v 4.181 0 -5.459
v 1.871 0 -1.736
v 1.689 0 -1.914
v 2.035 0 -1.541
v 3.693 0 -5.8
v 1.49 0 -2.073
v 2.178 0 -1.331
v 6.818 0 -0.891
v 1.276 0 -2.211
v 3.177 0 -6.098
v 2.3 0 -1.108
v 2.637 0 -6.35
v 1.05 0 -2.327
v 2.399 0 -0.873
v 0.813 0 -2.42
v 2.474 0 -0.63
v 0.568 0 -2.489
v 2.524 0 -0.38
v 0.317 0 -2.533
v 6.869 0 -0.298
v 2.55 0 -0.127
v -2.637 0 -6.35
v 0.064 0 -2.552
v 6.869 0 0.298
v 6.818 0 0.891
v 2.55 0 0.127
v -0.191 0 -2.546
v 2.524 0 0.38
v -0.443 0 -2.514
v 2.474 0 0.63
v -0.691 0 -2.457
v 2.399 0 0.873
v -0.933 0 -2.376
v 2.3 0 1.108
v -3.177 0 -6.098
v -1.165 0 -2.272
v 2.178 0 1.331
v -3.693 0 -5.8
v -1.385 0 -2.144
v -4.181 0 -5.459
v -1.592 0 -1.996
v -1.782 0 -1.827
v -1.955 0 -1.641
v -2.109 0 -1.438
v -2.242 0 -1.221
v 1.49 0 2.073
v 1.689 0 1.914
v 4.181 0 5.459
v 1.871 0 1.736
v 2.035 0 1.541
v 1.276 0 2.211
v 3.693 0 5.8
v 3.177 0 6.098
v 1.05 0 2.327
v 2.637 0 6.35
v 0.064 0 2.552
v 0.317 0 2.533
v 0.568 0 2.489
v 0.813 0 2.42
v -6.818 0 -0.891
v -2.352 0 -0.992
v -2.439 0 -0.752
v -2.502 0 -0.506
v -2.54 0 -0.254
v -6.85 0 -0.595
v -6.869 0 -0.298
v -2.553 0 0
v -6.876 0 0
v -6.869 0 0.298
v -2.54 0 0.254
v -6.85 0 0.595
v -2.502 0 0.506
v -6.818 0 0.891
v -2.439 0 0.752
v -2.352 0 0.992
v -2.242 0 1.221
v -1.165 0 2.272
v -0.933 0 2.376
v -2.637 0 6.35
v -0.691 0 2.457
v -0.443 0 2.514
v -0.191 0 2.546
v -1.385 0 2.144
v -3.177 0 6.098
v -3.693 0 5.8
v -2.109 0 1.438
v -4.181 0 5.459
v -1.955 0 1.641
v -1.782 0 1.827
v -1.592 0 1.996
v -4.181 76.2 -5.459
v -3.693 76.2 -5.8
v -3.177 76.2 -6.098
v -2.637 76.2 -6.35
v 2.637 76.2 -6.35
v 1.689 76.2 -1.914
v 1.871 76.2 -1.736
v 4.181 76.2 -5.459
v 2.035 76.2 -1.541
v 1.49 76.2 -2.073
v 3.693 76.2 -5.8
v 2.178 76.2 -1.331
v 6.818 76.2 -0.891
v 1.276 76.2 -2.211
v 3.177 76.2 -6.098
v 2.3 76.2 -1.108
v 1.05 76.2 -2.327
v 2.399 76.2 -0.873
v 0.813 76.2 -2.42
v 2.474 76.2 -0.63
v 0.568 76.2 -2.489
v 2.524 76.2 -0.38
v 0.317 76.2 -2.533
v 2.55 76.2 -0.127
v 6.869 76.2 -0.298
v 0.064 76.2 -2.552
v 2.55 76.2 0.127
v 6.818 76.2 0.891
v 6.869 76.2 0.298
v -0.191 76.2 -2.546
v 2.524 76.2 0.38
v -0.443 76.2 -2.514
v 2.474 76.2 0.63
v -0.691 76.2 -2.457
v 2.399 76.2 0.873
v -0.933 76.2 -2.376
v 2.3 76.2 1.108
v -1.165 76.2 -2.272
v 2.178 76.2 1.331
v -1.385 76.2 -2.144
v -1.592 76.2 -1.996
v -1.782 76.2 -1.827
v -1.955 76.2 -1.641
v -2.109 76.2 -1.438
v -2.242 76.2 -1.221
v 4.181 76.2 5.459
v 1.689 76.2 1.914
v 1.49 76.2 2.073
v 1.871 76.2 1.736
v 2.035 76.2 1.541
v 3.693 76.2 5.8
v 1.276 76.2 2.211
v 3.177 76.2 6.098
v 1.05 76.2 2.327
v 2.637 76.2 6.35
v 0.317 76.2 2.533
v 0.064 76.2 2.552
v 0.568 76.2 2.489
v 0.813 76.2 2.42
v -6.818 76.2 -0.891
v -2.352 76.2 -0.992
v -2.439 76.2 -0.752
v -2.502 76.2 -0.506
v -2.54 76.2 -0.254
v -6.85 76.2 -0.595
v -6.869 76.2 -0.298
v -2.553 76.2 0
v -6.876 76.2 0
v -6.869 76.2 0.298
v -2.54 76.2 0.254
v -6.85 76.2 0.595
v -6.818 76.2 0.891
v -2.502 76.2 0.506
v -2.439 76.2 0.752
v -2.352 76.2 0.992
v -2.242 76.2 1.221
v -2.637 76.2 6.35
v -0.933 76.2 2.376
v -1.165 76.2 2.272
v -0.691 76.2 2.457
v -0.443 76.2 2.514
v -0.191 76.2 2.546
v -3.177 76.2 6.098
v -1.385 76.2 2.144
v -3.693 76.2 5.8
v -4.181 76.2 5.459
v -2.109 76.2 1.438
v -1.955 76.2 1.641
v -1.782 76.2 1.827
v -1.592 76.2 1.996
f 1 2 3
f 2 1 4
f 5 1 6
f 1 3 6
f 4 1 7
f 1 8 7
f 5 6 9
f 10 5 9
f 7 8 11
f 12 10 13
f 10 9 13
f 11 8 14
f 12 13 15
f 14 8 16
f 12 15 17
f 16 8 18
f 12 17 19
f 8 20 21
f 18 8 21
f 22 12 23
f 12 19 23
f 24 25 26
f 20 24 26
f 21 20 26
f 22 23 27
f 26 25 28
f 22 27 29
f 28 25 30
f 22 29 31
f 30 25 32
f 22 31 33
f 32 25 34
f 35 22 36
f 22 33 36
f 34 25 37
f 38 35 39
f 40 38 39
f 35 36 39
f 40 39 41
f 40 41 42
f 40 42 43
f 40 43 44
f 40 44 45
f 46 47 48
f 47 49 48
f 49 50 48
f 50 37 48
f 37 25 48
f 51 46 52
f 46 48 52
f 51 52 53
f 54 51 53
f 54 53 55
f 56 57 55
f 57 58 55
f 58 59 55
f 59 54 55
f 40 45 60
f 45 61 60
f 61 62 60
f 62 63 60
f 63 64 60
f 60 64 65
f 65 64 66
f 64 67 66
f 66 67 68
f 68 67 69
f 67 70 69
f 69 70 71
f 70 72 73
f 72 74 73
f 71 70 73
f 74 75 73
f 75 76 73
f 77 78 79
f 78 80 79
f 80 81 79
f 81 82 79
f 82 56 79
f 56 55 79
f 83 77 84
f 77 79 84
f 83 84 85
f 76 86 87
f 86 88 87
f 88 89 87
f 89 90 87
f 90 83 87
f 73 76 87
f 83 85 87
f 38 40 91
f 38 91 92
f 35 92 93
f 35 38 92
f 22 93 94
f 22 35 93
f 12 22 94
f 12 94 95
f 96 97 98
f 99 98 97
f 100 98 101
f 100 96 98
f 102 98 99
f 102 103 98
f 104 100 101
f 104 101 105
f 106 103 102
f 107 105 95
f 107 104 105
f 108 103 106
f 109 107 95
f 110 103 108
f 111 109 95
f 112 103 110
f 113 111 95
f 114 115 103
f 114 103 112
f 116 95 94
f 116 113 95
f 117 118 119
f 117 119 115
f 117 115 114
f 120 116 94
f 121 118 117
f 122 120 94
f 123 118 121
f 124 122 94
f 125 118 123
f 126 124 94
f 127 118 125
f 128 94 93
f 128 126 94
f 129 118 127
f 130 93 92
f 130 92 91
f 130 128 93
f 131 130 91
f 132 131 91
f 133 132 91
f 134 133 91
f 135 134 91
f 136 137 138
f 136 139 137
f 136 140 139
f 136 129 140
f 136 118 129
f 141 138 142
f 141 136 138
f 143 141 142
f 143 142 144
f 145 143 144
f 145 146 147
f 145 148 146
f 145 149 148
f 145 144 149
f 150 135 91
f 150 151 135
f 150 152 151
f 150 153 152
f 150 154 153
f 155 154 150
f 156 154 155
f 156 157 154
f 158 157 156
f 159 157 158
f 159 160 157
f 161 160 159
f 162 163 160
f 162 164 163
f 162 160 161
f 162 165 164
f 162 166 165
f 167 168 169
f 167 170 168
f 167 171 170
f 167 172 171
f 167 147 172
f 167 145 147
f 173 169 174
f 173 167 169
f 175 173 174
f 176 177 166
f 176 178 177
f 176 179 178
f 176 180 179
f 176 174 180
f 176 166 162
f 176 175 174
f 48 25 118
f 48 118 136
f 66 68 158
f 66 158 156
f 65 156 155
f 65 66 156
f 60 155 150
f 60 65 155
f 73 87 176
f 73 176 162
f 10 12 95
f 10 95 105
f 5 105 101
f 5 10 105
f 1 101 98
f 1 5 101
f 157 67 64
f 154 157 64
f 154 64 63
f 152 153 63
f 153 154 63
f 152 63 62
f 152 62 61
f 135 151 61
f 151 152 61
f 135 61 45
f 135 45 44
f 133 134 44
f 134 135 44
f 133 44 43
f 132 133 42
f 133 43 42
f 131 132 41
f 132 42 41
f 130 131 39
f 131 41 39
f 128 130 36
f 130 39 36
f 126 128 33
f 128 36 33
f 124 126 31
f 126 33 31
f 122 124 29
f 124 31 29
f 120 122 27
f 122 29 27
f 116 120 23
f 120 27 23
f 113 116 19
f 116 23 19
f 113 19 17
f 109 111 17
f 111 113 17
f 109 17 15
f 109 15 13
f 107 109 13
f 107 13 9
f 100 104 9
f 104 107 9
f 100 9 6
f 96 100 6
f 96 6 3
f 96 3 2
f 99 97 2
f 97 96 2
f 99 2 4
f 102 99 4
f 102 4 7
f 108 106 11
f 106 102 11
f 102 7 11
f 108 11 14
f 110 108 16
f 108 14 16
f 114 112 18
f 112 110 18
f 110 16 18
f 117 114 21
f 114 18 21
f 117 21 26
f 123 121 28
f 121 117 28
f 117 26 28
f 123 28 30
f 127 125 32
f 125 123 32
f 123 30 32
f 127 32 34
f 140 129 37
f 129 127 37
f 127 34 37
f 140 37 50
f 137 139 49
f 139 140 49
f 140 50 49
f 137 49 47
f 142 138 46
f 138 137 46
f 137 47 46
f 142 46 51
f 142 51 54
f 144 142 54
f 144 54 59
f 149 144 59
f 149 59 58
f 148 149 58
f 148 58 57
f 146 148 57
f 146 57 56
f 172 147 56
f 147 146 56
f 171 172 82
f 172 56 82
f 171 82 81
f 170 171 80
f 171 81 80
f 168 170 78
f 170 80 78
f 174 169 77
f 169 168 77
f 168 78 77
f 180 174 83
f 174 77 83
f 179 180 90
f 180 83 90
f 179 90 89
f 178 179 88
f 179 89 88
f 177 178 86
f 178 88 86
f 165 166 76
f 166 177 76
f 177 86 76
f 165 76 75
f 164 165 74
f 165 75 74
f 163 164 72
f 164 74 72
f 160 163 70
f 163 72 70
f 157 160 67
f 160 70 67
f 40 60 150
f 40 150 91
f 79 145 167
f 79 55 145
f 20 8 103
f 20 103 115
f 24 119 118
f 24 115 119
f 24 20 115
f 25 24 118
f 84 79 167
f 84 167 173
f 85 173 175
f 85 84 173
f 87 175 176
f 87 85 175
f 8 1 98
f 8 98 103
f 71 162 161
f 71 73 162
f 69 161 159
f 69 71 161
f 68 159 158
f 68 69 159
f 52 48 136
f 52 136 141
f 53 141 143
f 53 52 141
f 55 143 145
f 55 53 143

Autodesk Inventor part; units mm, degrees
ref_plane "YZ Plane" through (0, 0, 0) normal (1, 0, 0) x (0, 1, 0)
ref_plane "XZ Plane" through (0, 0, 0) normal (0, 1, 0) x (-1, 0, 0)
ref_plane "XY Plane" through (0, 0, 0) normal (0, 0, 1) x (1, 0, 0)
sketch "Sketch1" plane through (0, 0, 0) normal (0, 1, 0) x (-1, 0, 0)
  line L0 (7.3323, 0) -> (3.6662, -6.35)
  line L1 (3.6662, -6.35) -> (-3.6662, -6.35)
  line L2 (-3.6662, -6.35) -> (-7.3323, 0)
  line L3 (-7.3323, 0) -> (-3.6662, 6.35)
  line L4 (-3.6662, 6.35) -> (3.6662, 6.35)
  line L5 (3.6662, 6.35) -> (7.3323, 0)
  circle A0 centre (0, 0) radius 2.5527
  circle A1 centre (0, 0) radius 6.8758
  point P0 (2.637, -6.35)
  point P1 (4.1808, -5.4587)
  point P2 (6.8178, -0.8913)
  point P3 (6.8178, 0.8913)
  point P4 (4.1808, 5.4587)
  point P5 (2.637, 6.35)
  point P6 (-2.637, 6.35)
  point P7 (-4.1808, 5.4587)
  point P8 (-6.8178, 0.8913)
  point P9 (-6.8178, -0.8913)
  point P10 (-4.1808, -5.4587)
  point P11 (-2.637, -6.35)
  dimension "d0" = 6.35
  dimension "d1" = 5.1054
  dimension "d2" = 13.7516
extrude "Extrusion1" add sketch "Sketch1" along normal blind 76.2 contours L0 A1 L1 L2 L3 L4 L5
properties part number "thunder hex 3in"
